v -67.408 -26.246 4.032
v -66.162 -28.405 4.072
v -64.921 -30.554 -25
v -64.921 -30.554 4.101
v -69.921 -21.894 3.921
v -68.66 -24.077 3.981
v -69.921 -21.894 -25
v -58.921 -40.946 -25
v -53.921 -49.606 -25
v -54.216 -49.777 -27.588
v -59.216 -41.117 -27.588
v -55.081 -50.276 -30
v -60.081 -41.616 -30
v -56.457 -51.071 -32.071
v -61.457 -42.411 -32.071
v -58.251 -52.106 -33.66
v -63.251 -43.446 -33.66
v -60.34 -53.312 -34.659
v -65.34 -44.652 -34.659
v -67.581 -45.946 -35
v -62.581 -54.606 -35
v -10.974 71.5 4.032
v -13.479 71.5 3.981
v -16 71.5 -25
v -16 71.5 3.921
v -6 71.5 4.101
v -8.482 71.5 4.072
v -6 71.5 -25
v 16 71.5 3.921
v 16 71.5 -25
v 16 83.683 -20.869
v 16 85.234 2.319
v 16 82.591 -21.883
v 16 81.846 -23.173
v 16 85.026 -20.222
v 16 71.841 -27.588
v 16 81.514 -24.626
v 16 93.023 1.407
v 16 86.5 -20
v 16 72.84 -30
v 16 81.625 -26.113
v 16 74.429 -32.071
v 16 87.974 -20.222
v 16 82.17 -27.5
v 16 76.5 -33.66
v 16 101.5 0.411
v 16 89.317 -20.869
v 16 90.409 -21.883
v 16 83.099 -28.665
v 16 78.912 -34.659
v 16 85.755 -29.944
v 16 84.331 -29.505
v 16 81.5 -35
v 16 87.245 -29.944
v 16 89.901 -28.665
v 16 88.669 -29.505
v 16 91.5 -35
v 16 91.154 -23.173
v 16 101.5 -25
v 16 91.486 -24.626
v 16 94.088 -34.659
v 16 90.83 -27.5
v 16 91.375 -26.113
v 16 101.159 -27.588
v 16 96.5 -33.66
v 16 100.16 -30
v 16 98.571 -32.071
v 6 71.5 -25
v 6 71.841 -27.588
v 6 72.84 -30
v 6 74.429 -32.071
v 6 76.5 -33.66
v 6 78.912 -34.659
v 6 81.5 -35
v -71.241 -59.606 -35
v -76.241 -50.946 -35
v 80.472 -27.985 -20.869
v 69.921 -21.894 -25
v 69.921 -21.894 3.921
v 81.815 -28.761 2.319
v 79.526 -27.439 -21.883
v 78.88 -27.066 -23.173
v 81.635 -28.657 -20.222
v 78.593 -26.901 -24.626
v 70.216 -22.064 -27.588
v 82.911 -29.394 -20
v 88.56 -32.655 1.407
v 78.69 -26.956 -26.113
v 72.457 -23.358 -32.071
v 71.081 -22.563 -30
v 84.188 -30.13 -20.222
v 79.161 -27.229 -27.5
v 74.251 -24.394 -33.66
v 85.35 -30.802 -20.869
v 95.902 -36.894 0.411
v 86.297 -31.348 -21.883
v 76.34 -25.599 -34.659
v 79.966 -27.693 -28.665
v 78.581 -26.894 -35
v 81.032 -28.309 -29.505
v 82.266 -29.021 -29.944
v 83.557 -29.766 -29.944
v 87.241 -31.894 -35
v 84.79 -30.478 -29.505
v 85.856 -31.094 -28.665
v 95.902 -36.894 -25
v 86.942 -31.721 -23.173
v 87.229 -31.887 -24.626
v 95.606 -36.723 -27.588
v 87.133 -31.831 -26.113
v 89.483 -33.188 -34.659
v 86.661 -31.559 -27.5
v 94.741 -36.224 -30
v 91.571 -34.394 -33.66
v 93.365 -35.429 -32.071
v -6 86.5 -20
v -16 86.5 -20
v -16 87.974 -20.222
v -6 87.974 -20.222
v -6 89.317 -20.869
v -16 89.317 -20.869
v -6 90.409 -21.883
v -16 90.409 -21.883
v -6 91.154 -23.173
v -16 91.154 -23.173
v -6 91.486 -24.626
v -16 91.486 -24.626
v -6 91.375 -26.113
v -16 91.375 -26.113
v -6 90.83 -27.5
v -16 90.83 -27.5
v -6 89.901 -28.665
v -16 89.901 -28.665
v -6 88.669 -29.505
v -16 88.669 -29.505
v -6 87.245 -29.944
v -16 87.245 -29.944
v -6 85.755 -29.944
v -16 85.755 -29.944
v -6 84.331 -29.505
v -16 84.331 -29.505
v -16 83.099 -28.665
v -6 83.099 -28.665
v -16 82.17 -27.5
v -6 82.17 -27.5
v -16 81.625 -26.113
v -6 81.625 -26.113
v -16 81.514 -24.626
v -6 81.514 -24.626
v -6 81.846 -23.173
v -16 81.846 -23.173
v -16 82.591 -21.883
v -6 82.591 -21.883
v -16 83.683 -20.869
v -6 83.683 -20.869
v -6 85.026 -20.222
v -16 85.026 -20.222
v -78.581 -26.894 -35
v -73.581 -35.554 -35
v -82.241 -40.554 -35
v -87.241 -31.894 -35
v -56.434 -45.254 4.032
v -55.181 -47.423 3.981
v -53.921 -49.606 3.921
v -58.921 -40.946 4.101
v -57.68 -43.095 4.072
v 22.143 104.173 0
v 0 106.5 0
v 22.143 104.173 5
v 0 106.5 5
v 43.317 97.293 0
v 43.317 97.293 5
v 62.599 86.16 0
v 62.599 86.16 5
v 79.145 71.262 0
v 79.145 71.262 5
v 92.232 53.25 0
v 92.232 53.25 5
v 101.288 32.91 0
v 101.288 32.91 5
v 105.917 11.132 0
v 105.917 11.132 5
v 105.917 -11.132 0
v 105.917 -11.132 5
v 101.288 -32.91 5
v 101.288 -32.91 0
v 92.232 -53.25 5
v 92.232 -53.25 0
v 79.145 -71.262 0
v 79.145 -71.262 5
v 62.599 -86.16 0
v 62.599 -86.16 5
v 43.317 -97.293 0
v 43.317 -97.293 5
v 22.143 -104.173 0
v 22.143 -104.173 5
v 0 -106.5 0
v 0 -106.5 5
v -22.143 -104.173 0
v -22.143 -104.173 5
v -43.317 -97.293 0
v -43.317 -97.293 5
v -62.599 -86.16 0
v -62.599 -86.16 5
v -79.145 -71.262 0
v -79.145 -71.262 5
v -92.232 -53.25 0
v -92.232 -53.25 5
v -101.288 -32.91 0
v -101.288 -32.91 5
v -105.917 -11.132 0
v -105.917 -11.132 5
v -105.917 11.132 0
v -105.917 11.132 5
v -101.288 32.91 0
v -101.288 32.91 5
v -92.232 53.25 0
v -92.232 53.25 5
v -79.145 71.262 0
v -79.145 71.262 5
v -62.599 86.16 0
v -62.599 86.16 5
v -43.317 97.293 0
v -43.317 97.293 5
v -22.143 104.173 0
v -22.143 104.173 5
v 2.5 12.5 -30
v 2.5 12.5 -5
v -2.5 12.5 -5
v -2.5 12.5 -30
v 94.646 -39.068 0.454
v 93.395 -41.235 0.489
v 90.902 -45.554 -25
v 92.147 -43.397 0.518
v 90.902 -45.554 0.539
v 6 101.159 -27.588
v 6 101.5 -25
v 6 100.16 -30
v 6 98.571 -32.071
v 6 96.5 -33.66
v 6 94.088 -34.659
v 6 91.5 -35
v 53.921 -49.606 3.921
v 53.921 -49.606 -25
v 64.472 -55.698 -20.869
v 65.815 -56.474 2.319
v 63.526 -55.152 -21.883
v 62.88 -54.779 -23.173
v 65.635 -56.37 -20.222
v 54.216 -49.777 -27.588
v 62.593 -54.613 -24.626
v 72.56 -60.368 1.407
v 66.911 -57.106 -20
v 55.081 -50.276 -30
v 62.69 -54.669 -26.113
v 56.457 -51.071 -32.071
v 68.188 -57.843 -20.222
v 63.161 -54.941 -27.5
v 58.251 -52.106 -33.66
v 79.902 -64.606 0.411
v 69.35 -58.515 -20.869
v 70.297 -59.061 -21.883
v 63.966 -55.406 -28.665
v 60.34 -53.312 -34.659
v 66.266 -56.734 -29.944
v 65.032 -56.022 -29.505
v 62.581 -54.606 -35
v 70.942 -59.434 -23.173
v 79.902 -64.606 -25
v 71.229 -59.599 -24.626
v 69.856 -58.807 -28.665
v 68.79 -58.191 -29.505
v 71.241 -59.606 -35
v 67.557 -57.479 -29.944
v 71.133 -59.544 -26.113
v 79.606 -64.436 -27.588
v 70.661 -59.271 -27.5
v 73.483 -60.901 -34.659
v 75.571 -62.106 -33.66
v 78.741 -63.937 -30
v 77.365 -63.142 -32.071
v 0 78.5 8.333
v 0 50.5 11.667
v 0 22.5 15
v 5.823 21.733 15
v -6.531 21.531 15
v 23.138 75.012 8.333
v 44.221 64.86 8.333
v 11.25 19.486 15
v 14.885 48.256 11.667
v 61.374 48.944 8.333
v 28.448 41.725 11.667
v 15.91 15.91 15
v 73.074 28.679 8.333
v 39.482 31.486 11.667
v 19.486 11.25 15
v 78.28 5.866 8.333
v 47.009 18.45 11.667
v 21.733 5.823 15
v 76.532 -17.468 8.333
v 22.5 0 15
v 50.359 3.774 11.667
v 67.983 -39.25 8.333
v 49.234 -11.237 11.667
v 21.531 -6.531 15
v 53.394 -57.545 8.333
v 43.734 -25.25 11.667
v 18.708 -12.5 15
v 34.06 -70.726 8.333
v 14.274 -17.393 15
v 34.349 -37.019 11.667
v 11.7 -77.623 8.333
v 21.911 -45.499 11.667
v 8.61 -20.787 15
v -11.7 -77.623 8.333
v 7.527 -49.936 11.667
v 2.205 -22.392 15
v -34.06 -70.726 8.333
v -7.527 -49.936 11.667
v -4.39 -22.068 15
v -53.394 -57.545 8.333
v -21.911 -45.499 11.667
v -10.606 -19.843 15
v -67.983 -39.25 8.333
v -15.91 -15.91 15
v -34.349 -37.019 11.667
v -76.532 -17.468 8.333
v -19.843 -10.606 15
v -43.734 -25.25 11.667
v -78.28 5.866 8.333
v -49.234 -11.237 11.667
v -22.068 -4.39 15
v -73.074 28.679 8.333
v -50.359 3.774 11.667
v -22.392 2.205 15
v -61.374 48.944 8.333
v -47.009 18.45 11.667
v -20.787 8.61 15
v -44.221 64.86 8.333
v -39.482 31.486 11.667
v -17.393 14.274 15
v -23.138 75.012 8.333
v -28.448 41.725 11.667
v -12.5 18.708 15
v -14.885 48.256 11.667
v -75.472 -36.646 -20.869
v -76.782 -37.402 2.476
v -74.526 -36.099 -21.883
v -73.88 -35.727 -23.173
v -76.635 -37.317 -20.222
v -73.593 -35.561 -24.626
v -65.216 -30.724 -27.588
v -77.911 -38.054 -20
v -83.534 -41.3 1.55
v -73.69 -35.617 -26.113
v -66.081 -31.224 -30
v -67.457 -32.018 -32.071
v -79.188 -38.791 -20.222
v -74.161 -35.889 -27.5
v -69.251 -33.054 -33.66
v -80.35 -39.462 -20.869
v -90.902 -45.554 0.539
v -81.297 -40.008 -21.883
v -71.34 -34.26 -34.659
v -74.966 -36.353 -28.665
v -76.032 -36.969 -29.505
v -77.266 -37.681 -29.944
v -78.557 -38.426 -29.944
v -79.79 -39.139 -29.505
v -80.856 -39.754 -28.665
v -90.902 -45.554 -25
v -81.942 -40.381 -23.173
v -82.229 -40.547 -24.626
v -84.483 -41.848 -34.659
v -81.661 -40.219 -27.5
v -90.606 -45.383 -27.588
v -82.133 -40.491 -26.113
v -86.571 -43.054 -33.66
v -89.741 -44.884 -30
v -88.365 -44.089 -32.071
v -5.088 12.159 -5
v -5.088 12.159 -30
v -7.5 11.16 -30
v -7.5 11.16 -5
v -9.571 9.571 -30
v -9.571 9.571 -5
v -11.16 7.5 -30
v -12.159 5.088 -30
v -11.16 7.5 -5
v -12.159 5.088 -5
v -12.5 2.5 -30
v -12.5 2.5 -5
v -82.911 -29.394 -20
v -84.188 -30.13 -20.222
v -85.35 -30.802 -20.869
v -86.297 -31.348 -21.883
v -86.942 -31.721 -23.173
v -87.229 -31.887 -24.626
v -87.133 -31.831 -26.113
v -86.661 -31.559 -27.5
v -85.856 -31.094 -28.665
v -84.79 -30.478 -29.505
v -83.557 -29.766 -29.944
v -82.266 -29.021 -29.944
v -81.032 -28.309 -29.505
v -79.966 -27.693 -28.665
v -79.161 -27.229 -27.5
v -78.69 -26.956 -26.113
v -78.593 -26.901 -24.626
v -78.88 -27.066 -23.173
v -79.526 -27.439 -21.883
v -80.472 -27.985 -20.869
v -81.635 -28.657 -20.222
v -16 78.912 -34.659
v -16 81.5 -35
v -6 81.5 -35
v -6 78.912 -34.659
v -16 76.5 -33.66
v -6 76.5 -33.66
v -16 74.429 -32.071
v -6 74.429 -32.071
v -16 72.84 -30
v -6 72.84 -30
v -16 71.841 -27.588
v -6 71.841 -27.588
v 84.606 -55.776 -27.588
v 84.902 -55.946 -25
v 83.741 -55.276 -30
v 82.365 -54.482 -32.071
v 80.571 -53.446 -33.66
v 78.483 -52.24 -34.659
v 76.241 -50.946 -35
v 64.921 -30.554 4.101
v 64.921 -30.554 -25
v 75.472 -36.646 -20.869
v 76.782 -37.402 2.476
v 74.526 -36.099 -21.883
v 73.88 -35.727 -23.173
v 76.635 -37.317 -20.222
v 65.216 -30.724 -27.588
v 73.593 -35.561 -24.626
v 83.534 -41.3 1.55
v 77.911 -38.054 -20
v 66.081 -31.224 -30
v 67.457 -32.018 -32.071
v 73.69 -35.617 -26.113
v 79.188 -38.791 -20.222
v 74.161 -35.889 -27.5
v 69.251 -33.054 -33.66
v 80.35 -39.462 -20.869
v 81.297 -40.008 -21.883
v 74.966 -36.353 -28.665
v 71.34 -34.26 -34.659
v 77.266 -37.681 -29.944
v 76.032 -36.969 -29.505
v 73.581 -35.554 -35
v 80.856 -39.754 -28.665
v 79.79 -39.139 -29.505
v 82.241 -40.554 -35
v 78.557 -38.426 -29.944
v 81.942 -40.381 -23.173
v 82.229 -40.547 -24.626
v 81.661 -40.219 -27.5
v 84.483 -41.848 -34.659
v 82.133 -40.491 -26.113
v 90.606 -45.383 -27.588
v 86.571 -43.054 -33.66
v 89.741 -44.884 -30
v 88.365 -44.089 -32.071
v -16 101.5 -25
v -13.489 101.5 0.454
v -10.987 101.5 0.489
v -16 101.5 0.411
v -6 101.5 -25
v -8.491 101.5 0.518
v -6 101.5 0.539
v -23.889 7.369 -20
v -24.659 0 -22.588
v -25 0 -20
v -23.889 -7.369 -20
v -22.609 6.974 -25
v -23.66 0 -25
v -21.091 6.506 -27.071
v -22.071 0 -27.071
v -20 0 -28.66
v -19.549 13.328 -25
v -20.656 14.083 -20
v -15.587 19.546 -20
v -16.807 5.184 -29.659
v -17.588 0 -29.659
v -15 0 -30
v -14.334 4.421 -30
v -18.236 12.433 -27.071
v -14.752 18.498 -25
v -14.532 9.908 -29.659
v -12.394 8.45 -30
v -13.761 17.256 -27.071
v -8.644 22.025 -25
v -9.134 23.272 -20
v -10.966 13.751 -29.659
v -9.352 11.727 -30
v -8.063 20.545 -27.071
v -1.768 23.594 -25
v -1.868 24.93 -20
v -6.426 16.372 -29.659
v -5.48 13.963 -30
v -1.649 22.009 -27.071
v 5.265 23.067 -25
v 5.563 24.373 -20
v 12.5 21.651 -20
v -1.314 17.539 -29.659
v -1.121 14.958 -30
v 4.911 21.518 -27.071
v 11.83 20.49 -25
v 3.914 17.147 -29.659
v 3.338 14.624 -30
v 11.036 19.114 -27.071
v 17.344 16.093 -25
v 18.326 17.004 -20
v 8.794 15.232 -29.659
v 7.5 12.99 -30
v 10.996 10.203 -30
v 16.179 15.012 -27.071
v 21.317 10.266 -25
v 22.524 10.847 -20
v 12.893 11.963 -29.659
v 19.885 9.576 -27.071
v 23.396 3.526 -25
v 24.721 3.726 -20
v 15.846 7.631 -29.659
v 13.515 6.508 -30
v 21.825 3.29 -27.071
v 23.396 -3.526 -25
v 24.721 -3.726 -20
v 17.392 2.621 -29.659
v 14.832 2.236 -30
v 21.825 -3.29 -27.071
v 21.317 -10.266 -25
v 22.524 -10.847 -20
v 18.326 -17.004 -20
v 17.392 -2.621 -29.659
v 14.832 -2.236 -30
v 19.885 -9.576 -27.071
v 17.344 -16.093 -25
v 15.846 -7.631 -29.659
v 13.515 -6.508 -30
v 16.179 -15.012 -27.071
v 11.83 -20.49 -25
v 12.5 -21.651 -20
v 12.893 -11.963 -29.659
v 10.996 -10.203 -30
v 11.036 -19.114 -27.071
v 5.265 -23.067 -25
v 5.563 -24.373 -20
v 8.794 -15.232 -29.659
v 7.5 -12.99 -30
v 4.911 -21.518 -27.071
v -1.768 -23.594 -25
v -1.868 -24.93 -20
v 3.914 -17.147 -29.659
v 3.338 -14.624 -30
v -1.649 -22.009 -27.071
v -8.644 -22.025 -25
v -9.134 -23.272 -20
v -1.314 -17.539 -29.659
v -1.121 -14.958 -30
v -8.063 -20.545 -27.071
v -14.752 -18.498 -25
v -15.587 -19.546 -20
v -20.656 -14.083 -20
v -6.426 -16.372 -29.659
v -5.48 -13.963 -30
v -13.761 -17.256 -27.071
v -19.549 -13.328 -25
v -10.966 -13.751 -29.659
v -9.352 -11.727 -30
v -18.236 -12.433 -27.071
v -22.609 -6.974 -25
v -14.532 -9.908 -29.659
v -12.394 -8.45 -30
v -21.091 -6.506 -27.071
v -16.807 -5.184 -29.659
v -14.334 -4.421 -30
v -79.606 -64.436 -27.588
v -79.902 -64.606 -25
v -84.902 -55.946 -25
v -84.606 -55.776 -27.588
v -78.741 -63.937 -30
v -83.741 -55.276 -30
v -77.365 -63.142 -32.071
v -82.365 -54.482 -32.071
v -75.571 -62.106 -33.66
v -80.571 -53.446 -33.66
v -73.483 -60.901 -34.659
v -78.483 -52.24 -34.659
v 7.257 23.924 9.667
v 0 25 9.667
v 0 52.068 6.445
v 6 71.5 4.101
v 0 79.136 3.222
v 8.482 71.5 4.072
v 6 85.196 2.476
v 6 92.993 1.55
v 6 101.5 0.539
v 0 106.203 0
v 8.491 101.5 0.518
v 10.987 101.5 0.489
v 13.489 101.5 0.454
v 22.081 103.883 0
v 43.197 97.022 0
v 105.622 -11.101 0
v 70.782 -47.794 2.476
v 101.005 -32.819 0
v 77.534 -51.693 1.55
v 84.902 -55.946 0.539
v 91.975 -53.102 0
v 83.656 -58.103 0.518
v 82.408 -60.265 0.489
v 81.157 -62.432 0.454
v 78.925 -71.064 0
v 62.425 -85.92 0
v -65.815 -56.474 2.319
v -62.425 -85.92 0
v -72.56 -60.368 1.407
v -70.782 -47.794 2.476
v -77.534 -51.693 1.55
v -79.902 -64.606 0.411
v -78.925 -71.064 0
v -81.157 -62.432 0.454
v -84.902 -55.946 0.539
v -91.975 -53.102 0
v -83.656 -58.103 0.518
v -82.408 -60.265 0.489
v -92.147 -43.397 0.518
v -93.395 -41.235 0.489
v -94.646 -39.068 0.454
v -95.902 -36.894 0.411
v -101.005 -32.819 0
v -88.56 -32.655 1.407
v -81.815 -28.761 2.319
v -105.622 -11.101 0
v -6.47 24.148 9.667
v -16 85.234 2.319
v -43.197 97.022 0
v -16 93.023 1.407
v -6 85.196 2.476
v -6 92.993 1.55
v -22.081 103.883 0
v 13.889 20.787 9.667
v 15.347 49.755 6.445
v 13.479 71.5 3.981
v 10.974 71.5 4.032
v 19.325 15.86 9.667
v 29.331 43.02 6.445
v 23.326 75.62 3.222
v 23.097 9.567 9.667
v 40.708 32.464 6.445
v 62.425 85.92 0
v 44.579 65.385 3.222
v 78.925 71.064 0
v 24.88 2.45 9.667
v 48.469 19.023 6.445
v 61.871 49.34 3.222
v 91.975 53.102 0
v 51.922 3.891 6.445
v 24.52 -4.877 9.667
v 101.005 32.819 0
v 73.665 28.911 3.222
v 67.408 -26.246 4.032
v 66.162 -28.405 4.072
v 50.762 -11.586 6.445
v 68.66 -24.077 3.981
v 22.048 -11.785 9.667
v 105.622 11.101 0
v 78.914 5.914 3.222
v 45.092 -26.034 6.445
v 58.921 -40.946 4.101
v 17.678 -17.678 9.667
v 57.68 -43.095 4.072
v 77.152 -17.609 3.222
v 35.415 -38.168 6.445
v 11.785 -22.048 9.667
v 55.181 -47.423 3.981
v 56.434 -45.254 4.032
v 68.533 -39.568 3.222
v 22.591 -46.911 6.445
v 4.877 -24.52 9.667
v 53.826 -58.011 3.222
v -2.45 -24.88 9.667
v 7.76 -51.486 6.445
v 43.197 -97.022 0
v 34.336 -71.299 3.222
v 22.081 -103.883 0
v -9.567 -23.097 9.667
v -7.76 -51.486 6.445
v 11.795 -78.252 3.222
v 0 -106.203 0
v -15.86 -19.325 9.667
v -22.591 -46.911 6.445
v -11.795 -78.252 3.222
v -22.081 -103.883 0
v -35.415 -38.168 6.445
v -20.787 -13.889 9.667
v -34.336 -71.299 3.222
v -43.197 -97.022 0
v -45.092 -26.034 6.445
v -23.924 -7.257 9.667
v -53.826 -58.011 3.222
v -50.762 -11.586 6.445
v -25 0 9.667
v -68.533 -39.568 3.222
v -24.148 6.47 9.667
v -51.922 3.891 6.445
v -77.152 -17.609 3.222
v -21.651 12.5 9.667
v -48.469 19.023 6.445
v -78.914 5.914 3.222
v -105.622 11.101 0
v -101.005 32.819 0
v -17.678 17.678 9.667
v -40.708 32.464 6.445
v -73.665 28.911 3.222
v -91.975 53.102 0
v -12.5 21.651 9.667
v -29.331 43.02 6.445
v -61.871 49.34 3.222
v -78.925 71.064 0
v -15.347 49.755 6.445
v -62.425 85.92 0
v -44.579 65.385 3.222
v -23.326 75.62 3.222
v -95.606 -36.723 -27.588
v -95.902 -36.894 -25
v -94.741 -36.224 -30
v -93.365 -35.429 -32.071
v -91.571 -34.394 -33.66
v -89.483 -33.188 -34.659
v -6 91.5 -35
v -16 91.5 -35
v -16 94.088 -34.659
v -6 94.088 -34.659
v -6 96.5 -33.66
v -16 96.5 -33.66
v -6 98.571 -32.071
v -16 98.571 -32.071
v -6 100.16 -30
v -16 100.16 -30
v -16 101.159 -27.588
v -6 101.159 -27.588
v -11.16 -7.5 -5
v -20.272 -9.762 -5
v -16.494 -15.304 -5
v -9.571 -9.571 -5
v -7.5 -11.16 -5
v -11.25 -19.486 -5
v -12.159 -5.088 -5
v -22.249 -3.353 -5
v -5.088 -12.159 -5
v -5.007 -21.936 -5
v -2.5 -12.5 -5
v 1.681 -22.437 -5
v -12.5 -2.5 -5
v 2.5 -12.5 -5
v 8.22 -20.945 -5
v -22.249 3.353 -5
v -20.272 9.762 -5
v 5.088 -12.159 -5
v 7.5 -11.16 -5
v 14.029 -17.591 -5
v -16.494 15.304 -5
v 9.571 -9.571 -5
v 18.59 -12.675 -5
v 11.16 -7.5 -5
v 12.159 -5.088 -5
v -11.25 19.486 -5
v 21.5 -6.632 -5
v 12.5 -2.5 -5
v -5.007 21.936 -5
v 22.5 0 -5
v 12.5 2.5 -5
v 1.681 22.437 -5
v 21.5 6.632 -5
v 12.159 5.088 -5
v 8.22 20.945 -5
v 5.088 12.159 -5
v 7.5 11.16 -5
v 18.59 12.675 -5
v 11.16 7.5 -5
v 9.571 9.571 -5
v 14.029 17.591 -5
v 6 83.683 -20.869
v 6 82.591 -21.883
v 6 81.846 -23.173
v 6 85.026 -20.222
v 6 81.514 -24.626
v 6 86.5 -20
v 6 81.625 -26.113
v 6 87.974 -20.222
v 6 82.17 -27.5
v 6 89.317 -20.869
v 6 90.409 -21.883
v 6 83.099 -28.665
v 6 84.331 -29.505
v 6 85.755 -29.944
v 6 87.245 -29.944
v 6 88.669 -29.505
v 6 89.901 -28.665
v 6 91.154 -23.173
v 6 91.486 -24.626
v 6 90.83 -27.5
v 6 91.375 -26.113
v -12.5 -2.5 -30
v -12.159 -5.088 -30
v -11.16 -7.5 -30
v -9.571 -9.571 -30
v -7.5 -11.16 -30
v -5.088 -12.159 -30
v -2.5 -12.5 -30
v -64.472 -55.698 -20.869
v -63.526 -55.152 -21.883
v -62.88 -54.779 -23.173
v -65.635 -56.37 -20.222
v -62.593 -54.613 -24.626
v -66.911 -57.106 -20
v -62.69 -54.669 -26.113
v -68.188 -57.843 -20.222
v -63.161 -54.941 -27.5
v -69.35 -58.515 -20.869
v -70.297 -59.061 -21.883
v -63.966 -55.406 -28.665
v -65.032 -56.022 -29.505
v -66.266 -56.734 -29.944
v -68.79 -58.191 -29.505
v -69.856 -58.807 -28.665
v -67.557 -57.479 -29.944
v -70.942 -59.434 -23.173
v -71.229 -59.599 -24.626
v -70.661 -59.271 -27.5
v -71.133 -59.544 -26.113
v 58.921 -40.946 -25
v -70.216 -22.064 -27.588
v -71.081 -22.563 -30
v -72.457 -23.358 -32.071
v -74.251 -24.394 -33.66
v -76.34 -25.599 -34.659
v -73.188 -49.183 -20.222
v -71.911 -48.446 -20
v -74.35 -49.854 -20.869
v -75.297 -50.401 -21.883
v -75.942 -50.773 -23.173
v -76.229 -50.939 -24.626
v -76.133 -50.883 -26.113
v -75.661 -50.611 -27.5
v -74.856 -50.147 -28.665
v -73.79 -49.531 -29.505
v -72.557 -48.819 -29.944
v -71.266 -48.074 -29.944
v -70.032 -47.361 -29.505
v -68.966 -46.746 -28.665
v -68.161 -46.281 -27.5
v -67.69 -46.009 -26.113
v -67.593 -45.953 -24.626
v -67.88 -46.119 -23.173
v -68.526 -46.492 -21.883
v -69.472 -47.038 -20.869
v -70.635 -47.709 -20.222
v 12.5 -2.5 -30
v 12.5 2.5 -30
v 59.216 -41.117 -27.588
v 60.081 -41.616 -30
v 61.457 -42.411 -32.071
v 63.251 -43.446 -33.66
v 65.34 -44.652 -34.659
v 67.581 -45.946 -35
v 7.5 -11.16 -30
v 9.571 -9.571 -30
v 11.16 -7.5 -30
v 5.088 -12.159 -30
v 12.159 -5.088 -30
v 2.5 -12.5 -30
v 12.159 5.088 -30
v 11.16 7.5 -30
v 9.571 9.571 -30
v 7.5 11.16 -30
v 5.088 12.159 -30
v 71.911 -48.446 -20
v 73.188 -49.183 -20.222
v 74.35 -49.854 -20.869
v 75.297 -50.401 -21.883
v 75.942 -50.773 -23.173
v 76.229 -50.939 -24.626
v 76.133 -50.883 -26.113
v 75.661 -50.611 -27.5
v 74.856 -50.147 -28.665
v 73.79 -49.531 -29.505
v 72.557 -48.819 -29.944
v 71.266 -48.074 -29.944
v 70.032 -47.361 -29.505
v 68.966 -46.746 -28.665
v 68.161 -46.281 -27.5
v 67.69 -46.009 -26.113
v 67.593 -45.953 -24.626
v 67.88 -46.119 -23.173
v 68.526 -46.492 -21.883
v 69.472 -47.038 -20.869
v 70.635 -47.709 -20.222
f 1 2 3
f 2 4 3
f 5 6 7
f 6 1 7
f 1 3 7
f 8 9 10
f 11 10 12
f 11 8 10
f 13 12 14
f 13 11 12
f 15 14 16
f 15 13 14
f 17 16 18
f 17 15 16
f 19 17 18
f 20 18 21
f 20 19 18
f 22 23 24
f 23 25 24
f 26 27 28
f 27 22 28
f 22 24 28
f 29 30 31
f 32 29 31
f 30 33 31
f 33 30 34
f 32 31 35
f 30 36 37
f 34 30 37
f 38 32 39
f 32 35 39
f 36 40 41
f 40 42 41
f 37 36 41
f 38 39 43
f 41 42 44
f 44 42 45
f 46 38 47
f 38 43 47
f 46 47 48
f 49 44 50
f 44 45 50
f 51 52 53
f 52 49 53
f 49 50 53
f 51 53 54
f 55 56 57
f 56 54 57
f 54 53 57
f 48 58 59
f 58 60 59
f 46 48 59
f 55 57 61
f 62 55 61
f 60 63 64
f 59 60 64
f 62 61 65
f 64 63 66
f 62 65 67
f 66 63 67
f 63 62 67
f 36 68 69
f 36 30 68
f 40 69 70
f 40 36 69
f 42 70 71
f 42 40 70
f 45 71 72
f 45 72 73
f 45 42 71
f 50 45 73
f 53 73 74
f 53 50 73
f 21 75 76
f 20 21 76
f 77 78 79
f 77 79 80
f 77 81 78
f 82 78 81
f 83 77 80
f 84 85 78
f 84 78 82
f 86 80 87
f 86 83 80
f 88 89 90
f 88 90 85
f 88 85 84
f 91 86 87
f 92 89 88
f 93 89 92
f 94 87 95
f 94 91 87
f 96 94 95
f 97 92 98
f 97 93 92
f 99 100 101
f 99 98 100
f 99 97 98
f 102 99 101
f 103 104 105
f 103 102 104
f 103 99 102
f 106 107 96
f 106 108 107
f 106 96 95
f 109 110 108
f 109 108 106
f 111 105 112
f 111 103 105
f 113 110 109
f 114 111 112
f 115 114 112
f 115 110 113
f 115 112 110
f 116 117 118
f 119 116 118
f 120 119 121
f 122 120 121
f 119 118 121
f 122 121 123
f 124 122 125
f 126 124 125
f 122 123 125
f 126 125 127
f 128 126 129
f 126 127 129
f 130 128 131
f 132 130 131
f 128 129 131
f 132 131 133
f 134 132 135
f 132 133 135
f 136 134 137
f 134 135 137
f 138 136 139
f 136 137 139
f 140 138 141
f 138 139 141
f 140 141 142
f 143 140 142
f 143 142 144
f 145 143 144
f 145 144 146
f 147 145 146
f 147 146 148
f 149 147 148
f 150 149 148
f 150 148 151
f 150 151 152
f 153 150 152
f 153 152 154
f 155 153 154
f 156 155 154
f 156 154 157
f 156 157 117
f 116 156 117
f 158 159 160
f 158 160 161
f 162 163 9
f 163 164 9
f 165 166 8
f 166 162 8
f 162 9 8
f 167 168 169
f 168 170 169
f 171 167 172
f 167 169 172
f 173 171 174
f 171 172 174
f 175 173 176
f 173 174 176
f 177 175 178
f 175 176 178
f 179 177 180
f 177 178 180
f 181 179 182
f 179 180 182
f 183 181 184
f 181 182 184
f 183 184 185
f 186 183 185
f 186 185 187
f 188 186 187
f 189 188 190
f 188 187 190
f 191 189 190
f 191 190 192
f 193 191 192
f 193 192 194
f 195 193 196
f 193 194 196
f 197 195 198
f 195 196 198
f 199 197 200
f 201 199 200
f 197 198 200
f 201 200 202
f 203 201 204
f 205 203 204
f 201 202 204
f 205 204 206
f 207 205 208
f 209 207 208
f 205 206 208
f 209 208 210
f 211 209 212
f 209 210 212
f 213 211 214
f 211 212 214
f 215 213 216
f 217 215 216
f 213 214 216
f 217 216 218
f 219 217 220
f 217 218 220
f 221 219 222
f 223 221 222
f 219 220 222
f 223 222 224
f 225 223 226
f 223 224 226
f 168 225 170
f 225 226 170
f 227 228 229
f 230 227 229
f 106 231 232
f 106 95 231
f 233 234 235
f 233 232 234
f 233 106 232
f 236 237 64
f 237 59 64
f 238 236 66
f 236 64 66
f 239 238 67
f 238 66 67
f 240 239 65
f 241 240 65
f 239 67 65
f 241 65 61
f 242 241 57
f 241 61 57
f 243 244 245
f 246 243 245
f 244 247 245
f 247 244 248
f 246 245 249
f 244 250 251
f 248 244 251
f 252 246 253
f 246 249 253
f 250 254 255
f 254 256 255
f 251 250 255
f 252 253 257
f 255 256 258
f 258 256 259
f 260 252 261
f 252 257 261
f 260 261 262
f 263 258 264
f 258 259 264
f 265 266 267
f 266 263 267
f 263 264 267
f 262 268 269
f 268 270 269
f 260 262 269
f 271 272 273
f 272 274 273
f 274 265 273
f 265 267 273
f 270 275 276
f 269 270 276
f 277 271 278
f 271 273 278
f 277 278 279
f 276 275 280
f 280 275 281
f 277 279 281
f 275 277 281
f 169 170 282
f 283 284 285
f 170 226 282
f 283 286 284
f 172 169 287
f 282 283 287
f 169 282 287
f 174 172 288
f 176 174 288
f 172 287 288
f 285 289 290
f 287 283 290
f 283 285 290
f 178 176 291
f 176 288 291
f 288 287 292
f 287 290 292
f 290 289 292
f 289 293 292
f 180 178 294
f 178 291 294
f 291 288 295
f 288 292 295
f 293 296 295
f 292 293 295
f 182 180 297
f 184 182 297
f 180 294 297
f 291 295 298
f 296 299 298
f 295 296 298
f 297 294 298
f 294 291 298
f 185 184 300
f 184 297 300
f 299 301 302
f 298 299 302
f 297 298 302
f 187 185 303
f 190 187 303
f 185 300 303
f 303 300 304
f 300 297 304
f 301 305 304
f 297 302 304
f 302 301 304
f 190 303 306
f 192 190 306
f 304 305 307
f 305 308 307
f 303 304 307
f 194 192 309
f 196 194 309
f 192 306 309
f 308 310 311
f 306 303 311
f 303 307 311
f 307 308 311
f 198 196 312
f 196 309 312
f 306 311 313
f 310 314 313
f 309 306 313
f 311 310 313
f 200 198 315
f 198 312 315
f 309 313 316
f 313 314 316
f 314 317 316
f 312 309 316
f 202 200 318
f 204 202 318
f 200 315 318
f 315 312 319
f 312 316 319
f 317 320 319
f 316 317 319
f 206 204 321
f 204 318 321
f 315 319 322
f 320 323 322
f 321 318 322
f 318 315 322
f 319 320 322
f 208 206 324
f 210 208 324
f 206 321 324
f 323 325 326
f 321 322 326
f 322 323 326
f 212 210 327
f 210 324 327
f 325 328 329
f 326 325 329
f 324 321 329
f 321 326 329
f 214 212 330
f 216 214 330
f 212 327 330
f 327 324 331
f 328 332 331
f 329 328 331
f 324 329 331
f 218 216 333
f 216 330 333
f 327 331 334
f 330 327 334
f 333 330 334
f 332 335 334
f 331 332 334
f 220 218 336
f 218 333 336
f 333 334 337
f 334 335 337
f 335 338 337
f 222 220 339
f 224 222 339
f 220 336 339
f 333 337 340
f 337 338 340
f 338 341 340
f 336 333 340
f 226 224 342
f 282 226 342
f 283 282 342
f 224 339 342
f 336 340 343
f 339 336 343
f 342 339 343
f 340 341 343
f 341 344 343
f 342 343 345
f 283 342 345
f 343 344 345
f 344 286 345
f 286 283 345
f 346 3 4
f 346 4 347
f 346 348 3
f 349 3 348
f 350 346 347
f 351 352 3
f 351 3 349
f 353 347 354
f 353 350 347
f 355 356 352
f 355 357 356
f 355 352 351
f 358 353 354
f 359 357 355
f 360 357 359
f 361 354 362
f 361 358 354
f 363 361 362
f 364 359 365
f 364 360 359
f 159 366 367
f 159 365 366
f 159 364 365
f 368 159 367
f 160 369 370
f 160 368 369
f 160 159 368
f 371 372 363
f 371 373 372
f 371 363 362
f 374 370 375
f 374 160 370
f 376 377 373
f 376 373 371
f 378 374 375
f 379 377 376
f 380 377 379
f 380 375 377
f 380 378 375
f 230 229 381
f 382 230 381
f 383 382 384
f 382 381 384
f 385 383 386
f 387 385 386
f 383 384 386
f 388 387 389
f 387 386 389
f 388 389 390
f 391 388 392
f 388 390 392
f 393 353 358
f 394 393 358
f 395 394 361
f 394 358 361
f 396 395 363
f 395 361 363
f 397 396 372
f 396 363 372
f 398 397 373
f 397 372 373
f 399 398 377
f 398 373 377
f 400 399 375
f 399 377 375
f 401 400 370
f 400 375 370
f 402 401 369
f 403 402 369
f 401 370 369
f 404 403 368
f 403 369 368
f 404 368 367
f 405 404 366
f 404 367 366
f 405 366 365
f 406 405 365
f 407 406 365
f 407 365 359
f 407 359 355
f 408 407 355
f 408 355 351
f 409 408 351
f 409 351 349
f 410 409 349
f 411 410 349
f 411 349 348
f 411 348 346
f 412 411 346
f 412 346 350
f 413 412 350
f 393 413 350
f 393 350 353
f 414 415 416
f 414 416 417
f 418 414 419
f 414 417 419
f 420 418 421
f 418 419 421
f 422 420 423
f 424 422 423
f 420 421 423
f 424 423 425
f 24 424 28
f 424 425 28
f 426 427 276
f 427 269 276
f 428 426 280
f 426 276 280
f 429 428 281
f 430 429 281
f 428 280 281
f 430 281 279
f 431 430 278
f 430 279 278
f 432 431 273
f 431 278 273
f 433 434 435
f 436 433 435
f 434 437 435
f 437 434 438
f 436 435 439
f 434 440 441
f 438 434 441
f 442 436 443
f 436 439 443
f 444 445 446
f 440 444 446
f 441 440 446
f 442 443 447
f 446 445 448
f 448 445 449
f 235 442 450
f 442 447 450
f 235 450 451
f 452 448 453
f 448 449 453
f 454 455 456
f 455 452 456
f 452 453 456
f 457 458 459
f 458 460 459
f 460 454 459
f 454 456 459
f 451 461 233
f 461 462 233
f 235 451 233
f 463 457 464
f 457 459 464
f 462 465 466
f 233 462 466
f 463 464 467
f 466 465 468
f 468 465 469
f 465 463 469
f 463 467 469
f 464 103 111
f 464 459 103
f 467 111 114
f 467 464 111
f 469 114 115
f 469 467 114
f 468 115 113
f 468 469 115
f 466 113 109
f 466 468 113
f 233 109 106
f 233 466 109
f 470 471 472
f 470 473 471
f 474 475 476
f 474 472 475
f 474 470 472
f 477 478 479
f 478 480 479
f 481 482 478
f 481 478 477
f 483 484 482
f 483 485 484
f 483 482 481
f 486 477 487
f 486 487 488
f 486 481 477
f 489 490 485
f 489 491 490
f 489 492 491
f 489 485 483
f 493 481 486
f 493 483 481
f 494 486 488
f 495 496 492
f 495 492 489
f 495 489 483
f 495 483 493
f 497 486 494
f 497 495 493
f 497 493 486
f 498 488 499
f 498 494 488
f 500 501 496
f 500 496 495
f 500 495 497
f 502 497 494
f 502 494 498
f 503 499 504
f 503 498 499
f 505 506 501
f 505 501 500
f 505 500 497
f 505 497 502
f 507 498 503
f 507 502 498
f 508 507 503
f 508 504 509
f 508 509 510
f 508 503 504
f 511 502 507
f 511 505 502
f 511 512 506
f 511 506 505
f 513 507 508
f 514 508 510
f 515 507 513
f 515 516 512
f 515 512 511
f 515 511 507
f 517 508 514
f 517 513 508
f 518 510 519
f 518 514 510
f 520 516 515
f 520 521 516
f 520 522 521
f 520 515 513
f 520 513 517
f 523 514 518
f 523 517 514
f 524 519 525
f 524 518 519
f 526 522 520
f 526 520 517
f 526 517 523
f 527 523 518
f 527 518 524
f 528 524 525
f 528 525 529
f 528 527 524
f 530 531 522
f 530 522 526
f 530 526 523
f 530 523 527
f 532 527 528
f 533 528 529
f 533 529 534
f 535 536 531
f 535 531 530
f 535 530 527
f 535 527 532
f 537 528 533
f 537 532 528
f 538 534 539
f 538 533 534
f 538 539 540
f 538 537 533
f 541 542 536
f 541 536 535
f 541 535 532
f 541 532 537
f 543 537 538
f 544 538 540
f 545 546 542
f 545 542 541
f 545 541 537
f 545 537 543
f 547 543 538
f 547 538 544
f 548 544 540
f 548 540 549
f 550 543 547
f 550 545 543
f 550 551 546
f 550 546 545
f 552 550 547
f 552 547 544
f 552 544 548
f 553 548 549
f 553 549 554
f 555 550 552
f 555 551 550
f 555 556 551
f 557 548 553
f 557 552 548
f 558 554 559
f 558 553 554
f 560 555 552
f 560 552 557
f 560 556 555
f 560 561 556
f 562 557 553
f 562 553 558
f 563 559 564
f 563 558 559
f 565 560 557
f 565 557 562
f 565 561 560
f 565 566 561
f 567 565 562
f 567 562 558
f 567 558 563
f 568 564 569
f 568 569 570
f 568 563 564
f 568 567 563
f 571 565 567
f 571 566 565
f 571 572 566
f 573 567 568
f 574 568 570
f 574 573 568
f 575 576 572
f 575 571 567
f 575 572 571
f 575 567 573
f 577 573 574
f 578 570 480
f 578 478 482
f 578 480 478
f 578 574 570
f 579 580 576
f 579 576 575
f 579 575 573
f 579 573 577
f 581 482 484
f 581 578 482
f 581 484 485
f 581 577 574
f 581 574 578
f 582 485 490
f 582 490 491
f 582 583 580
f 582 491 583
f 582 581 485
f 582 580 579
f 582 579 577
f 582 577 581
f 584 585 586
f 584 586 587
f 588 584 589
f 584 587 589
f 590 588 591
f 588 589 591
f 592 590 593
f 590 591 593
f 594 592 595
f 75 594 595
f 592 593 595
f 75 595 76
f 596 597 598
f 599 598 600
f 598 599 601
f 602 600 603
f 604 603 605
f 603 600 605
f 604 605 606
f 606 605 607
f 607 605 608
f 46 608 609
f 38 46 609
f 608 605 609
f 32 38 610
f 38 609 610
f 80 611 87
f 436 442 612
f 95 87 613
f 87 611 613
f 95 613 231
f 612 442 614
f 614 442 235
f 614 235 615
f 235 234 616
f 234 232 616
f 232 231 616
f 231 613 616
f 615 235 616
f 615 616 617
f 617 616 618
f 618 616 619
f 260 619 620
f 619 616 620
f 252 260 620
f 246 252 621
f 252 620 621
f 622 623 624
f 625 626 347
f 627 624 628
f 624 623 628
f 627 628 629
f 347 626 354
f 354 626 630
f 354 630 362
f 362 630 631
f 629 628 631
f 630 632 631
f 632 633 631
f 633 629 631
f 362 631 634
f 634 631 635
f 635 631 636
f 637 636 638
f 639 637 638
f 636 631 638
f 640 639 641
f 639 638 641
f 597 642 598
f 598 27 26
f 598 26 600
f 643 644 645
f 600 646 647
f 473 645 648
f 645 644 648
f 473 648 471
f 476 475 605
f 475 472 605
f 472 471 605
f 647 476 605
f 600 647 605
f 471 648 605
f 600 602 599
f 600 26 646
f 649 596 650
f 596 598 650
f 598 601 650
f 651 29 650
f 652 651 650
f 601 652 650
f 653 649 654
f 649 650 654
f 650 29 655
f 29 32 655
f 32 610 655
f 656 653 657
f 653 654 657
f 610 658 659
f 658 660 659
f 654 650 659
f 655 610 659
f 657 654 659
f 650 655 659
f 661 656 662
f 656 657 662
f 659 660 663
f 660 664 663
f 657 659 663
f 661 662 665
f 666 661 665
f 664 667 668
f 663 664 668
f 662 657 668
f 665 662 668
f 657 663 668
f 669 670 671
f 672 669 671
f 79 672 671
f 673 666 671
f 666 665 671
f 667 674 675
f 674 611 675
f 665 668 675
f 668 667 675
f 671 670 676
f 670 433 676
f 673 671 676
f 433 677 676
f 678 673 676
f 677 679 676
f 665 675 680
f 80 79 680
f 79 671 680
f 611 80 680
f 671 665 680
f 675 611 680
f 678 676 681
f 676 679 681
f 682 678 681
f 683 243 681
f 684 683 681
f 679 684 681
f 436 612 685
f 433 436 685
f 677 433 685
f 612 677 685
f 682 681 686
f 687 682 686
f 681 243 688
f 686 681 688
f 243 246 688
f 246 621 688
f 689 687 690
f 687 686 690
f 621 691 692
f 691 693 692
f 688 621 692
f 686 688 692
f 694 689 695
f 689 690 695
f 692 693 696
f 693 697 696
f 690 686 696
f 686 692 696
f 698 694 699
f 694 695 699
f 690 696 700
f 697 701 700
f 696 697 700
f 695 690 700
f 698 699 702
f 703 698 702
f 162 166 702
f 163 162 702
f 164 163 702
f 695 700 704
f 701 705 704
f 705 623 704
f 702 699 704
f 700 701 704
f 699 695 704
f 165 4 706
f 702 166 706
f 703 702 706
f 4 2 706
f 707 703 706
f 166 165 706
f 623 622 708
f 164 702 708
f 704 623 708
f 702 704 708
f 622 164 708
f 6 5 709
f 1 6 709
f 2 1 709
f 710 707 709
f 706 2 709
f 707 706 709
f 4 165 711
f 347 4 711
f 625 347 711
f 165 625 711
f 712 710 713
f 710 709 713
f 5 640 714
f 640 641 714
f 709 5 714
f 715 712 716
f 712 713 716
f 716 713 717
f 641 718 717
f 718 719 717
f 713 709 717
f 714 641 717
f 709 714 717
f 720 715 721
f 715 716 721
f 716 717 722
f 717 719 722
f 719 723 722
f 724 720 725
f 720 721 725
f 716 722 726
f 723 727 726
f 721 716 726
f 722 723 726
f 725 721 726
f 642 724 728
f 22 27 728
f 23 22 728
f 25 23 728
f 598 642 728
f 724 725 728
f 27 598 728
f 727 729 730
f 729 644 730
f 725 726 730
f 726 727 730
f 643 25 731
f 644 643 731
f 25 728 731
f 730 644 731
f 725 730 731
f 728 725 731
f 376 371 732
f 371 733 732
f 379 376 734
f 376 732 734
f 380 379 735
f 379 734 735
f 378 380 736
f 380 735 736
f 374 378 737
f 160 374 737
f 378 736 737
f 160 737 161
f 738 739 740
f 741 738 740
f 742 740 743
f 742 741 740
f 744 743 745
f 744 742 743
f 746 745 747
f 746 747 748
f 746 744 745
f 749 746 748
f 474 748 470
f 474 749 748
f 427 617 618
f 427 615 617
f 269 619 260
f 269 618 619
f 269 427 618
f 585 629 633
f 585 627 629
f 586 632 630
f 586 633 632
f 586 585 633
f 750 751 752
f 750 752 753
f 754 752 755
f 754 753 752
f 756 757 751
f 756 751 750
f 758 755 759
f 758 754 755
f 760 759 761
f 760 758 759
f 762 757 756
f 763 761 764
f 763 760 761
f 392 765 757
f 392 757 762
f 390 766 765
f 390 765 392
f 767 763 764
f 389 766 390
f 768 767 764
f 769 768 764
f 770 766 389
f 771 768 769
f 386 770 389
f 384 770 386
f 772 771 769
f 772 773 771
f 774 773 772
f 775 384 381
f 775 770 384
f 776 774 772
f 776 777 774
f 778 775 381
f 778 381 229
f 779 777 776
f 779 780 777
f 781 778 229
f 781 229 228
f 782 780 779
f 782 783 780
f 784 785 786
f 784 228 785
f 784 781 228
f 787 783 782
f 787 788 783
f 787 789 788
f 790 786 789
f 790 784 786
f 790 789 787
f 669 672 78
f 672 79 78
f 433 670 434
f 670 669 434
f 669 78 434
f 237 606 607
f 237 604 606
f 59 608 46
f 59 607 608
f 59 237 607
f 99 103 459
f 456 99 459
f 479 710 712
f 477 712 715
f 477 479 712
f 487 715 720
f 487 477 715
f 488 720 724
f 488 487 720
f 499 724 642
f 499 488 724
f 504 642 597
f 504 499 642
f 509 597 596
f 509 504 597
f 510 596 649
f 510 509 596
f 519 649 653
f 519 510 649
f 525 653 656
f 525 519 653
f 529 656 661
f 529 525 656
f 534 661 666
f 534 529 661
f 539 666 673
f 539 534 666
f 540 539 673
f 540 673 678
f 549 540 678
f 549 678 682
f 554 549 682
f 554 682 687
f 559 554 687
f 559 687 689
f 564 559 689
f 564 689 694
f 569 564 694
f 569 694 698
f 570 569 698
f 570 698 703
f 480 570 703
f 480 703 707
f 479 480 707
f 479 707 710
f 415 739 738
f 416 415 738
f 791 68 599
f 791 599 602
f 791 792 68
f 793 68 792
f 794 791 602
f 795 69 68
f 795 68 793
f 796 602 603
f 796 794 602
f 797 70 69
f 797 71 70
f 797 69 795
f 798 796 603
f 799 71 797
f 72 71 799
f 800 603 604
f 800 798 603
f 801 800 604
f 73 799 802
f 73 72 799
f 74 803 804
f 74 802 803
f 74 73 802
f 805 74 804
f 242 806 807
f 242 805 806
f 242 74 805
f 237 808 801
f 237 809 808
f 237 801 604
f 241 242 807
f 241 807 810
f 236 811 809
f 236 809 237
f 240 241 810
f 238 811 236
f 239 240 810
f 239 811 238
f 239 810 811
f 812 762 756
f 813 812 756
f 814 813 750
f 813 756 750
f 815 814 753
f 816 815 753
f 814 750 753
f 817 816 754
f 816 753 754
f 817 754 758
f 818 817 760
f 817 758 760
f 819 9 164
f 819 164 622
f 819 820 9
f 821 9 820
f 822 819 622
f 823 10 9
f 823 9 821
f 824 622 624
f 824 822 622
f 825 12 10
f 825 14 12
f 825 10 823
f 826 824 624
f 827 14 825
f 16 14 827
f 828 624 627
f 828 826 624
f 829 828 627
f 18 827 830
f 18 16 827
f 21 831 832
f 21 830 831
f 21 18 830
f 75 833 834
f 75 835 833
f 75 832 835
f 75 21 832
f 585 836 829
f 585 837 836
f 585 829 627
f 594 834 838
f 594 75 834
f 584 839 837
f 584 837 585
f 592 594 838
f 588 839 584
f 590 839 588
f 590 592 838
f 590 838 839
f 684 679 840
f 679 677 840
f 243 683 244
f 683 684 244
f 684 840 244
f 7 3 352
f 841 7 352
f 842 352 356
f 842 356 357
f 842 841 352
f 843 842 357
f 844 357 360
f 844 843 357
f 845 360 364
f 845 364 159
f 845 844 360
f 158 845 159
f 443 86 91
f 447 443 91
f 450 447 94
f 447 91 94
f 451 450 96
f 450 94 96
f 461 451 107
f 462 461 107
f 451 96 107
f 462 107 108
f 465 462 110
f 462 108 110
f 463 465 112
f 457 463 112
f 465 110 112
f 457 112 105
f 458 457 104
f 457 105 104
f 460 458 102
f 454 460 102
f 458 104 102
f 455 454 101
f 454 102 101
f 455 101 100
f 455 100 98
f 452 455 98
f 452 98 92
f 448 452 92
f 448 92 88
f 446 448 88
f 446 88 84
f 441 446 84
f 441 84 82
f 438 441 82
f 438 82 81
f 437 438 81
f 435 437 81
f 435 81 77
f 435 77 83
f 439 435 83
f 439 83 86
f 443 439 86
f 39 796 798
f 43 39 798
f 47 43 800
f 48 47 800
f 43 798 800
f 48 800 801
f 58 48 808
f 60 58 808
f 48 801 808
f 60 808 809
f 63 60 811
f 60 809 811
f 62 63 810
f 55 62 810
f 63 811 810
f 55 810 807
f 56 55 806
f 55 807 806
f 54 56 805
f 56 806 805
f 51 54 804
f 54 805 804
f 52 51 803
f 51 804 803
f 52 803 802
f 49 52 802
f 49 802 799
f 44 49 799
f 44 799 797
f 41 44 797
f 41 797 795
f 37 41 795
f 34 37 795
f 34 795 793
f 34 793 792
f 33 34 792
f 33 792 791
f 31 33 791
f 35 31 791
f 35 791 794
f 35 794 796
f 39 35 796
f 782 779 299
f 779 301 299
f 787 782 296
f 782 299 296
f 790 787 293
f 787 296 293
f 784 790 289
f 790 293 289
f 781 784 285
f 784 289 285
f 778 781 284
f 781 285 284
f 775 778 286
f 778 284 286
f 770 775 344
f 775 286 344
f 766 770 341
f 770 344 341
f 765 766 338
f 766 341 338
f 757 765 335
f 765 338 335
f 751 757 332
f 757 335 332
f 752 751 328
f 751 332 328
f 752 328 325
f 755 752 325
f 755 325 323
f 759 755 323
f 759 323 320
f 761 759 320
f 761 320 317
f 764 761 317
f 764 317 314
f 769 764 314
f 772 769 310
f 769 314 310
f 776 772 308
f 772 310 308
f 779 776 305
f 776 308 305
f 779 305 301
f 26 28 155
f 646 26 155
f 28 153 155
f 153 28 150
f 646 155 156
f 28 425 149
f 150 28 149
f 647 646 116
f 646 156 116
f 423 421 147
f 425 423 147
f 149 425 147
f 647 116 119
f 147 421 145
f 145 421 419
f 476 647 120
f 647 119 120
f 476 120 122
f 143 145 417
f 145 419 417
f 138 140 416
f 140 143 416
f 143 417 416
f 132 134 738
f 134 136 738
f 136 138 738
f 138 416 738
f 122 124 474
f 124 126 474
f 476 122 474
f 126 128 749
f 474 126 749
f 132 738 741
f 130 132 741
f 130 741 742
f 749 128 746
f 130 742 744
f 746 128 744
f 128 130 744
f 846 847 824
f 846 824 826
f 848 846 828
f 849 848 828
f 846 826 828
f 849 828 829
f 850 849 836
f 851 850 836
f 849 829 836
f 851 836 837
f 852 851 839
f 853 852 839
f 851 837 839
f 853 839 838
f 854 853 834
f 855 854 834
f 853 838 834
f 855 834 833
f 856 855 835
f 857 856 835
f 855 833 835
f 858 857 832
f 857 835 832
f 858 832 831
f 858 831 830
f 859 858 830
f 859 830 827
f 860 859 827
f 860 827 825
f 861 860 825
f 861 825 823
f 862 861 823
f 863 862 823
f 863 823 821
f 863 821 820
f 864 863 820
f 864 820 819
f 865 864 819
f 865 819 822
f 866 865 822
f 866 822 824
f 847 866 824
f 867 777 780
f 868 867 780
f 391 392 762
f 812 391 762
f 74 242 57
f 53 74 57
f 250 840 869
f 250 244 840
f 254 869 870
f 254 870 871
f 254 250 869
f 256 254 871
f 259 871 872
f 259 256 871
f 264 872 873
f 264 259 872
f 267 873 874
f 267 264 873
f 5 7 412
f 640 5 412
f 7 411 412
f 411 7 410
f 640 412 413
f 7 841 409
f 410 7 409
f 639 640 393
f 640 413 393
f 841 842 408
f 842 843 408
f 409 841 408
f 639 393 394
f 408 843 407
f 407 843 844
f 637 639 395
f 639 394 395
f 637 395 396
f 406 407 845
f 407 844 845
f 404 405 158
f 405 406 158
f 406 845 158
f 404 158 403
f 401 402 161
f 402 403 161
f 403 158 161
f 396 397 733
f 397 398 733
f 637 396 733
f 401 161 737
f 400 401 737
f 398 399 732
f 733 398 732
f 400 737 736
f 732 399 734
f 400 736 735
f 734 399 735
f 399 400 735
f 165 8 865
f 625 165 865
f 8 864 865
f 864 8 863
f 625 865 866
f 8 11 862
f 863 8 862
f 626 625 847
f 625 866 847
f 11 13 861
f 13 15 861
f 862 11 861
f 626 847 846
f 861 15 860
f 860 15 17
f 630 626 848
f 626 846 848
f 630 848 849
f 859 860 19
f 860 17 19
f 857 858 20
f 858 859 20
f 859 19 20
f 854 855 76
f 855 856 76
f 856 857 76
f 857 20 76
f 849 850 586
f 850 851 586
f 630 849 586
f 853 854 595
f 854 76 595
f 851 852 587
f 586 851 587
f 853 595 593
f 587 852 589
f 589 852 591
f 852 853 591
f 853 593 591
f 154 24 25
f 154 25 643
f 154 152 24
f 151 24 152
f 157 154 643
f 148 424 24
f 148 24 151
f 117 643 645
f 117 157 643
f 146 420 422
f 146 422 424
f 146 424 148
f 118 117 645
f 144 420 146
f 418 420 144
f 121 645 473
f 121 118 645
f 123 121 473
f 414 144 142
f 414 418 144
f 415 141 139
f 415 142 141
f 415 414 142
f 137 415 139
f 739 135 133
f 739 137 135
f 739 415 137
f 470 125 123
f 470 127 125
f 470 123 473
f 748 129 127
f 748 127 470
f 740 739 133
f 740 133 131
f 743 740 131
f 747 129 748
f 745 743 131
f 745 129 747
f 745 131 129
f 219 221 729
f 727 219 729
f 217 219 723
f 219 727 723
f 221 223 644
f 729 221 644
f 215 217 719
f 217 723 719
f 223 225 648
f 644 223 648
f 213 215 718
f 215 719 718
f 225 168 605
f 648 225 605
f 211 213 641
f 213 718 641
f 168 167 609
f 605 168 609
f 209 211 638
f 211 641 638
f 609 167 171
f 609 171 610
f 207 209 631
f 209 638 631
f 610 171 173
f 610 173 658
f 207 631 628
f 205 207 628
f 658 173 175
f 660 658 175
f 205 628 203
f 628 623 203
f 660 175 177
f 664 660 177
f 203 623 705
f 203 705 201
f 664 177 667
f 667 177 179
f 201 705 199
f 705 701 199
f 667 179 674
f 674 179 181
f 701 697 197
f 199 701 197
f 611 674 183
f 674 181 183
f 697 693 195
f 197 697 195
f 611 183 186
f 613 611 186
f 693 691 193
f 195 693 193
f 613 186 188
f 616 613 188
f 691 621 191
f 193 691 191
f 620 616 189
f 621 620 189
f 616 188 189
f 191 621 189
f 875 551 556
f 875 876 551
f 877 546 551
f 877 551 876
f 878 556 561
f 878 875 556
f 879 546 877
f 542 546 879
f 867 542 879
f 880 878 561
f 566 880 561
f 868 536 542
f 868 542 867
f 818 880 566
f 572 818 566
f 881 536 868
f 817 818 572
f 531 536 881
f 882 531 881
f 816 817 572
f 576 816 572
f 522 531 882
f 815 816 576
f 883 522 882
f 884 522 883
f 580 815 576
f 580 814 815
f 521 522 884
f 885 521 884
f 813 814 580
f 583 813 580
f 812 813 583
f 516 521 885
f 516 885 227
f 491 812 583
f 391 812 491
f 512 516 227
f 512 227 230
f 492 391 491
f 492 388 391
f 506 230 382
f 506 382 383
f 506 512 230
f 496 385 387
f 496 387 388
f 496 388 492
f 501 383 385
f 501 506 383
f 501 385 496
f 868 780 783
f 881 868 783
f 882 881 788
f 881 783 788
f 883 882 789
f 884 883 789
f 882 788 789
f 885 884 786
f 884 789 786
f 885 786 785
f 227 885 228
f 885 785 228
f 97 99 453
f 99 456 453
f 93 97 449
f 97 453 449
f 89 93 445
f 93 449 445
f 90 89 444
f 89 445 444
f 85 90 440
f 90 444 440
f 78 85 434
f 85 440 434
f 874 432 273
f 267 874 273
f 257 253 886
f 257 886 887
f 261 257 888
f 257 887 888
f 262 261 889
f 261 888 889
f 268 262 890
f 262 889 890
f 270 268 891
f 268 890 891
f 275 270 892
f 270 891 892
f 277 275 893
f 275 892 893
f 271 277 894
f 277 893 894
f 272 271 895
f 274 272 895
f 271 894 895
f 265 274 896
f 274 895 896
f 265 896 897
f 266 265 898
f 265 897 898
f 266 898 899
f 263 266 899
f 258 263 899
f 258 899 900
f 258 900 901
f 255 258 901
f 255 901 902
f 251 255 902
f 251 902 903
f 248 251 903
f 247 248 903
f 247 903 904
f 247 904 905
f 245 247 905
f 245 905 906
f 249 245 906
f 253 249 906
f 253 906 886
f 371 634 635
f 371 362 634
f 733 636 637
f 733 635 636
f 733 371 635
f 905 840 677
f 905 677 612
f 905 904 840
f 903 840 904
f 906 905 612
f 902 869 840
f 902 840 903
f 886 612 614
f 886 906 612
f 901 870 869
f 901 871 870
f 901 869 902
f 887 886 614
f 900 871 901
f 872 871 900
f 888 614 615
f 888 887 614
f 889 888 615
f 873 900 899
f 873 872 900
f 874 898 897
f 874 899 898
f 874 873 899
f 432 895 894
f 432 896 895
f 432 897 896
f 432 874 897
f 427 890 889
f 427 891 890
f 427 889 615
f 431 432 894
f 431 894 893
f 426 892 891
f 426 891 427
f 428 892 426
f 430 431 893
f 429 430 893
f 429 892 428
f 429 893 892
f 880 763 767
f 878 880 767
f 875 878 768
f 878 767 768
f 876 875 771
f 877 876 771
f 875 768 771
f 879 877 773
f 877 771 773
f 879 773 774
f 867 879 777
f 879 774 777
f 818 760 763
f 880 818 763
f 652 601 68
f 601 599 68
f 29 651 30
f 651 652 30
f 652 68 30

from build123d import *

# Parameters (mm, degrees)
SKETCH1_R                = 22.5
BOSS_EXTRUDE1_DEPTH      = 15
SKETCH4_R                = 25
BOSS_EXTRUDE2_DEPTH      = 30
BOSS_EXTRUDE2_DEPTH_BACK = 10
SKETCH1_3_R              = 22.5
CUT_EXTRUDE1_DEPTH       = 5
SKETCH1_4_R              = 22.5
CUT_EXTRUDE2_DEPTH       = 15
BOSS_EXTRUDE3_START      = -30
SKETCH10_W               = 10
SKETCH10_H               = 30
BOSS_EXTRUDE3_DEPTH      = 39.101444
FILLET1_R                = 10
SKETCH11_R               = 5
CUT_EXTRUDE3_DEPTH       = 32
CIRPATTERN1_COUNT        = 3
FILLET1_OF_CIRPATTERN1_R = 10
FILLET2_R                = 10


with BuildPart() as part:
    # Sketch1 → Boss-Extrude1 (new body)
    with BuildSketch(Plane.XY):
        Circle(SKETCH1_R)
    extrude(amount=BOSS_EXTRUDE1_DEPTH)

    # Sketch3 → Revolve1 (revolve)
    with BuildSketch(Plane(origin=(0, 0, 0), x_dir=(0, 0, -1), z_dir=(1, 0, 0))):
        Polygon((-5, 106.5), (-15, 22.5), (-9.964693814, 22.5), (0, 106.203428035), (0, 106.5), align=None)
    revolve(axis=Axis((0, 0, 15), (0, 0, -1)))

    # Sketch4 → Boss-Extrude2 (add, two sides)
    with BuildSketch(Plane(origin=(0, 0, 0), x_dir=(-1, 0, 0), z_dir=(0, 0, -1))) as boss_extrude2_sk:
        Circle(SKETCH4_R)
        with BuildLine():
            Line((-2.5, 12.5), (2.5, 12.5))
            ThreePointArc((2.5, 12.5), (9.571067812, 9.571067812), (12.5, 2.5))
            Line((12.5, 2.5), (12.5, -2.5))
            ThreePointArc((12.5, -2.5), (9.571067812, -9.571067812), (2.5, -12.5))
            Line((2.5, -12.5), (-2.5, -12.5))
            ThreePointArc((-2.5, -12.5), (-9.571067812, -9.571067812), (-12.5, -2.5))
            Line((-12.5, -2.5), (-12.5, 2.5))
            ThreePointArc((-12.5, 2.5), (-9.571067812, 9.571067812), (-2.5, 12.5))
        make_face(mode=Mode.SUBTRACT)
    extrude(amount=BOSS_EXTRUDE2_DEPTH)
    extrude(boss_extrude2_sk.sketch, amount=-BOSS_EXTRUDE2_DEPTH_BACK)

    # Sketch1<3> → Cut-Extrude1 (cut)
    with BuildSketch(Plane.XY):
        Circle(SKETCH1_3_R)
    extrude(amount=-CUT_EXTRUDE1_DEPTH, mode=Mode.SUBTRACT)

    # Sketch1<4> → Cut-Extrude2 (cut)
    with BuildSketch(Plane.XY):
        Circle(SKETCH1_4_R)
    extrude(amount=CUT_EXTRUDE2_DEPTH, mode=Mode.SUBTRACT)

    # Sketch10 → Boss-Extrude3 (add)
    with BuildSketch(Plane.XY.offset(-5).offset(BOSS_EXTRUDE3_START)):
        with Locations((-11, 86.5)):
            Rectangle(SKETCH10_W, SKETCH10_H)
        with Locations((11, 86.5)):
            Rectangle(SKETCH10_W, SKETCH10_H)
    boss_extrude3 = extrude(amount=BOSS_EXTRUDE3_DEPTH)

    # Fillet1
    fillet1_edges = [part.edges().sort_by_distance(p)[0] for p in [
        (-11, 101.5, -35),
        (-11, 71.5, -35),
        (11, 101.5, -35),
        (11, 71.5, -35),
    ]]
    fillet(fillet1_edges, radius=FILLET1_R)

    # Sketch11 → Cut-Extrude3 (cut)
    with BuildSketch(Plane.ZY.offset(16)):
        with Locations((-25, 86.5)):
            Circle(SKETCH11_R)
    cut_extrude3 = extrude(amount=-CUT_EXTRUDE3_DEPTH, mode=Mode.SUBTRACT)

    # CirPattern1: Boss-Extrude3, Cut-Extrude3 ×3 about axis
    cirpattern1_axis = Axis((0, 0, 0), (0, 0, 1))
    for i in range(1, CIRPATTERN1_COUNT):
        add(boss_extrude3.rotate(cirpattern1_axis, i * 360 / CIRPATTERN1_COUNT))
        add(cut_extrude3.rotate(cirpattern1_axis, i * 360 / CIRPATTERN1_COUNT), mode=Mode.SUBTRACT)

    # Fillet1 of CirPattern1
    fillet1_of_cirpattern1_edges = [part.edges().sort_by_distance(p)[0] for p in [
        (-82.401578484, -60.276279442, -35),
        (-56.420816371, -45.276279442, -35),
        (-93.401578484, -41.223720558, -35),
        (-67.420816371, -26.223720558, -35),
        (93.401578484, -41.223720558, -35),
        (67.420816371, -26.223720558, -35),
        (82.401578484, -60.276279442, -35),
        (56.420816371, -45.276279442, -35),
    ]]
    fillet(fillet1_of_cirpattern1_edges, radius=FILLET1_OF_CIRPATTERN1_R)

    # Fillet2
    fillet2_edges = [part.edges().sort_by_distance(p)[0] for p in [
        (25, 0, -30),
    ]]
    fillet(fillet2_edges, radius=FILLET2_R)


solid = part.part
